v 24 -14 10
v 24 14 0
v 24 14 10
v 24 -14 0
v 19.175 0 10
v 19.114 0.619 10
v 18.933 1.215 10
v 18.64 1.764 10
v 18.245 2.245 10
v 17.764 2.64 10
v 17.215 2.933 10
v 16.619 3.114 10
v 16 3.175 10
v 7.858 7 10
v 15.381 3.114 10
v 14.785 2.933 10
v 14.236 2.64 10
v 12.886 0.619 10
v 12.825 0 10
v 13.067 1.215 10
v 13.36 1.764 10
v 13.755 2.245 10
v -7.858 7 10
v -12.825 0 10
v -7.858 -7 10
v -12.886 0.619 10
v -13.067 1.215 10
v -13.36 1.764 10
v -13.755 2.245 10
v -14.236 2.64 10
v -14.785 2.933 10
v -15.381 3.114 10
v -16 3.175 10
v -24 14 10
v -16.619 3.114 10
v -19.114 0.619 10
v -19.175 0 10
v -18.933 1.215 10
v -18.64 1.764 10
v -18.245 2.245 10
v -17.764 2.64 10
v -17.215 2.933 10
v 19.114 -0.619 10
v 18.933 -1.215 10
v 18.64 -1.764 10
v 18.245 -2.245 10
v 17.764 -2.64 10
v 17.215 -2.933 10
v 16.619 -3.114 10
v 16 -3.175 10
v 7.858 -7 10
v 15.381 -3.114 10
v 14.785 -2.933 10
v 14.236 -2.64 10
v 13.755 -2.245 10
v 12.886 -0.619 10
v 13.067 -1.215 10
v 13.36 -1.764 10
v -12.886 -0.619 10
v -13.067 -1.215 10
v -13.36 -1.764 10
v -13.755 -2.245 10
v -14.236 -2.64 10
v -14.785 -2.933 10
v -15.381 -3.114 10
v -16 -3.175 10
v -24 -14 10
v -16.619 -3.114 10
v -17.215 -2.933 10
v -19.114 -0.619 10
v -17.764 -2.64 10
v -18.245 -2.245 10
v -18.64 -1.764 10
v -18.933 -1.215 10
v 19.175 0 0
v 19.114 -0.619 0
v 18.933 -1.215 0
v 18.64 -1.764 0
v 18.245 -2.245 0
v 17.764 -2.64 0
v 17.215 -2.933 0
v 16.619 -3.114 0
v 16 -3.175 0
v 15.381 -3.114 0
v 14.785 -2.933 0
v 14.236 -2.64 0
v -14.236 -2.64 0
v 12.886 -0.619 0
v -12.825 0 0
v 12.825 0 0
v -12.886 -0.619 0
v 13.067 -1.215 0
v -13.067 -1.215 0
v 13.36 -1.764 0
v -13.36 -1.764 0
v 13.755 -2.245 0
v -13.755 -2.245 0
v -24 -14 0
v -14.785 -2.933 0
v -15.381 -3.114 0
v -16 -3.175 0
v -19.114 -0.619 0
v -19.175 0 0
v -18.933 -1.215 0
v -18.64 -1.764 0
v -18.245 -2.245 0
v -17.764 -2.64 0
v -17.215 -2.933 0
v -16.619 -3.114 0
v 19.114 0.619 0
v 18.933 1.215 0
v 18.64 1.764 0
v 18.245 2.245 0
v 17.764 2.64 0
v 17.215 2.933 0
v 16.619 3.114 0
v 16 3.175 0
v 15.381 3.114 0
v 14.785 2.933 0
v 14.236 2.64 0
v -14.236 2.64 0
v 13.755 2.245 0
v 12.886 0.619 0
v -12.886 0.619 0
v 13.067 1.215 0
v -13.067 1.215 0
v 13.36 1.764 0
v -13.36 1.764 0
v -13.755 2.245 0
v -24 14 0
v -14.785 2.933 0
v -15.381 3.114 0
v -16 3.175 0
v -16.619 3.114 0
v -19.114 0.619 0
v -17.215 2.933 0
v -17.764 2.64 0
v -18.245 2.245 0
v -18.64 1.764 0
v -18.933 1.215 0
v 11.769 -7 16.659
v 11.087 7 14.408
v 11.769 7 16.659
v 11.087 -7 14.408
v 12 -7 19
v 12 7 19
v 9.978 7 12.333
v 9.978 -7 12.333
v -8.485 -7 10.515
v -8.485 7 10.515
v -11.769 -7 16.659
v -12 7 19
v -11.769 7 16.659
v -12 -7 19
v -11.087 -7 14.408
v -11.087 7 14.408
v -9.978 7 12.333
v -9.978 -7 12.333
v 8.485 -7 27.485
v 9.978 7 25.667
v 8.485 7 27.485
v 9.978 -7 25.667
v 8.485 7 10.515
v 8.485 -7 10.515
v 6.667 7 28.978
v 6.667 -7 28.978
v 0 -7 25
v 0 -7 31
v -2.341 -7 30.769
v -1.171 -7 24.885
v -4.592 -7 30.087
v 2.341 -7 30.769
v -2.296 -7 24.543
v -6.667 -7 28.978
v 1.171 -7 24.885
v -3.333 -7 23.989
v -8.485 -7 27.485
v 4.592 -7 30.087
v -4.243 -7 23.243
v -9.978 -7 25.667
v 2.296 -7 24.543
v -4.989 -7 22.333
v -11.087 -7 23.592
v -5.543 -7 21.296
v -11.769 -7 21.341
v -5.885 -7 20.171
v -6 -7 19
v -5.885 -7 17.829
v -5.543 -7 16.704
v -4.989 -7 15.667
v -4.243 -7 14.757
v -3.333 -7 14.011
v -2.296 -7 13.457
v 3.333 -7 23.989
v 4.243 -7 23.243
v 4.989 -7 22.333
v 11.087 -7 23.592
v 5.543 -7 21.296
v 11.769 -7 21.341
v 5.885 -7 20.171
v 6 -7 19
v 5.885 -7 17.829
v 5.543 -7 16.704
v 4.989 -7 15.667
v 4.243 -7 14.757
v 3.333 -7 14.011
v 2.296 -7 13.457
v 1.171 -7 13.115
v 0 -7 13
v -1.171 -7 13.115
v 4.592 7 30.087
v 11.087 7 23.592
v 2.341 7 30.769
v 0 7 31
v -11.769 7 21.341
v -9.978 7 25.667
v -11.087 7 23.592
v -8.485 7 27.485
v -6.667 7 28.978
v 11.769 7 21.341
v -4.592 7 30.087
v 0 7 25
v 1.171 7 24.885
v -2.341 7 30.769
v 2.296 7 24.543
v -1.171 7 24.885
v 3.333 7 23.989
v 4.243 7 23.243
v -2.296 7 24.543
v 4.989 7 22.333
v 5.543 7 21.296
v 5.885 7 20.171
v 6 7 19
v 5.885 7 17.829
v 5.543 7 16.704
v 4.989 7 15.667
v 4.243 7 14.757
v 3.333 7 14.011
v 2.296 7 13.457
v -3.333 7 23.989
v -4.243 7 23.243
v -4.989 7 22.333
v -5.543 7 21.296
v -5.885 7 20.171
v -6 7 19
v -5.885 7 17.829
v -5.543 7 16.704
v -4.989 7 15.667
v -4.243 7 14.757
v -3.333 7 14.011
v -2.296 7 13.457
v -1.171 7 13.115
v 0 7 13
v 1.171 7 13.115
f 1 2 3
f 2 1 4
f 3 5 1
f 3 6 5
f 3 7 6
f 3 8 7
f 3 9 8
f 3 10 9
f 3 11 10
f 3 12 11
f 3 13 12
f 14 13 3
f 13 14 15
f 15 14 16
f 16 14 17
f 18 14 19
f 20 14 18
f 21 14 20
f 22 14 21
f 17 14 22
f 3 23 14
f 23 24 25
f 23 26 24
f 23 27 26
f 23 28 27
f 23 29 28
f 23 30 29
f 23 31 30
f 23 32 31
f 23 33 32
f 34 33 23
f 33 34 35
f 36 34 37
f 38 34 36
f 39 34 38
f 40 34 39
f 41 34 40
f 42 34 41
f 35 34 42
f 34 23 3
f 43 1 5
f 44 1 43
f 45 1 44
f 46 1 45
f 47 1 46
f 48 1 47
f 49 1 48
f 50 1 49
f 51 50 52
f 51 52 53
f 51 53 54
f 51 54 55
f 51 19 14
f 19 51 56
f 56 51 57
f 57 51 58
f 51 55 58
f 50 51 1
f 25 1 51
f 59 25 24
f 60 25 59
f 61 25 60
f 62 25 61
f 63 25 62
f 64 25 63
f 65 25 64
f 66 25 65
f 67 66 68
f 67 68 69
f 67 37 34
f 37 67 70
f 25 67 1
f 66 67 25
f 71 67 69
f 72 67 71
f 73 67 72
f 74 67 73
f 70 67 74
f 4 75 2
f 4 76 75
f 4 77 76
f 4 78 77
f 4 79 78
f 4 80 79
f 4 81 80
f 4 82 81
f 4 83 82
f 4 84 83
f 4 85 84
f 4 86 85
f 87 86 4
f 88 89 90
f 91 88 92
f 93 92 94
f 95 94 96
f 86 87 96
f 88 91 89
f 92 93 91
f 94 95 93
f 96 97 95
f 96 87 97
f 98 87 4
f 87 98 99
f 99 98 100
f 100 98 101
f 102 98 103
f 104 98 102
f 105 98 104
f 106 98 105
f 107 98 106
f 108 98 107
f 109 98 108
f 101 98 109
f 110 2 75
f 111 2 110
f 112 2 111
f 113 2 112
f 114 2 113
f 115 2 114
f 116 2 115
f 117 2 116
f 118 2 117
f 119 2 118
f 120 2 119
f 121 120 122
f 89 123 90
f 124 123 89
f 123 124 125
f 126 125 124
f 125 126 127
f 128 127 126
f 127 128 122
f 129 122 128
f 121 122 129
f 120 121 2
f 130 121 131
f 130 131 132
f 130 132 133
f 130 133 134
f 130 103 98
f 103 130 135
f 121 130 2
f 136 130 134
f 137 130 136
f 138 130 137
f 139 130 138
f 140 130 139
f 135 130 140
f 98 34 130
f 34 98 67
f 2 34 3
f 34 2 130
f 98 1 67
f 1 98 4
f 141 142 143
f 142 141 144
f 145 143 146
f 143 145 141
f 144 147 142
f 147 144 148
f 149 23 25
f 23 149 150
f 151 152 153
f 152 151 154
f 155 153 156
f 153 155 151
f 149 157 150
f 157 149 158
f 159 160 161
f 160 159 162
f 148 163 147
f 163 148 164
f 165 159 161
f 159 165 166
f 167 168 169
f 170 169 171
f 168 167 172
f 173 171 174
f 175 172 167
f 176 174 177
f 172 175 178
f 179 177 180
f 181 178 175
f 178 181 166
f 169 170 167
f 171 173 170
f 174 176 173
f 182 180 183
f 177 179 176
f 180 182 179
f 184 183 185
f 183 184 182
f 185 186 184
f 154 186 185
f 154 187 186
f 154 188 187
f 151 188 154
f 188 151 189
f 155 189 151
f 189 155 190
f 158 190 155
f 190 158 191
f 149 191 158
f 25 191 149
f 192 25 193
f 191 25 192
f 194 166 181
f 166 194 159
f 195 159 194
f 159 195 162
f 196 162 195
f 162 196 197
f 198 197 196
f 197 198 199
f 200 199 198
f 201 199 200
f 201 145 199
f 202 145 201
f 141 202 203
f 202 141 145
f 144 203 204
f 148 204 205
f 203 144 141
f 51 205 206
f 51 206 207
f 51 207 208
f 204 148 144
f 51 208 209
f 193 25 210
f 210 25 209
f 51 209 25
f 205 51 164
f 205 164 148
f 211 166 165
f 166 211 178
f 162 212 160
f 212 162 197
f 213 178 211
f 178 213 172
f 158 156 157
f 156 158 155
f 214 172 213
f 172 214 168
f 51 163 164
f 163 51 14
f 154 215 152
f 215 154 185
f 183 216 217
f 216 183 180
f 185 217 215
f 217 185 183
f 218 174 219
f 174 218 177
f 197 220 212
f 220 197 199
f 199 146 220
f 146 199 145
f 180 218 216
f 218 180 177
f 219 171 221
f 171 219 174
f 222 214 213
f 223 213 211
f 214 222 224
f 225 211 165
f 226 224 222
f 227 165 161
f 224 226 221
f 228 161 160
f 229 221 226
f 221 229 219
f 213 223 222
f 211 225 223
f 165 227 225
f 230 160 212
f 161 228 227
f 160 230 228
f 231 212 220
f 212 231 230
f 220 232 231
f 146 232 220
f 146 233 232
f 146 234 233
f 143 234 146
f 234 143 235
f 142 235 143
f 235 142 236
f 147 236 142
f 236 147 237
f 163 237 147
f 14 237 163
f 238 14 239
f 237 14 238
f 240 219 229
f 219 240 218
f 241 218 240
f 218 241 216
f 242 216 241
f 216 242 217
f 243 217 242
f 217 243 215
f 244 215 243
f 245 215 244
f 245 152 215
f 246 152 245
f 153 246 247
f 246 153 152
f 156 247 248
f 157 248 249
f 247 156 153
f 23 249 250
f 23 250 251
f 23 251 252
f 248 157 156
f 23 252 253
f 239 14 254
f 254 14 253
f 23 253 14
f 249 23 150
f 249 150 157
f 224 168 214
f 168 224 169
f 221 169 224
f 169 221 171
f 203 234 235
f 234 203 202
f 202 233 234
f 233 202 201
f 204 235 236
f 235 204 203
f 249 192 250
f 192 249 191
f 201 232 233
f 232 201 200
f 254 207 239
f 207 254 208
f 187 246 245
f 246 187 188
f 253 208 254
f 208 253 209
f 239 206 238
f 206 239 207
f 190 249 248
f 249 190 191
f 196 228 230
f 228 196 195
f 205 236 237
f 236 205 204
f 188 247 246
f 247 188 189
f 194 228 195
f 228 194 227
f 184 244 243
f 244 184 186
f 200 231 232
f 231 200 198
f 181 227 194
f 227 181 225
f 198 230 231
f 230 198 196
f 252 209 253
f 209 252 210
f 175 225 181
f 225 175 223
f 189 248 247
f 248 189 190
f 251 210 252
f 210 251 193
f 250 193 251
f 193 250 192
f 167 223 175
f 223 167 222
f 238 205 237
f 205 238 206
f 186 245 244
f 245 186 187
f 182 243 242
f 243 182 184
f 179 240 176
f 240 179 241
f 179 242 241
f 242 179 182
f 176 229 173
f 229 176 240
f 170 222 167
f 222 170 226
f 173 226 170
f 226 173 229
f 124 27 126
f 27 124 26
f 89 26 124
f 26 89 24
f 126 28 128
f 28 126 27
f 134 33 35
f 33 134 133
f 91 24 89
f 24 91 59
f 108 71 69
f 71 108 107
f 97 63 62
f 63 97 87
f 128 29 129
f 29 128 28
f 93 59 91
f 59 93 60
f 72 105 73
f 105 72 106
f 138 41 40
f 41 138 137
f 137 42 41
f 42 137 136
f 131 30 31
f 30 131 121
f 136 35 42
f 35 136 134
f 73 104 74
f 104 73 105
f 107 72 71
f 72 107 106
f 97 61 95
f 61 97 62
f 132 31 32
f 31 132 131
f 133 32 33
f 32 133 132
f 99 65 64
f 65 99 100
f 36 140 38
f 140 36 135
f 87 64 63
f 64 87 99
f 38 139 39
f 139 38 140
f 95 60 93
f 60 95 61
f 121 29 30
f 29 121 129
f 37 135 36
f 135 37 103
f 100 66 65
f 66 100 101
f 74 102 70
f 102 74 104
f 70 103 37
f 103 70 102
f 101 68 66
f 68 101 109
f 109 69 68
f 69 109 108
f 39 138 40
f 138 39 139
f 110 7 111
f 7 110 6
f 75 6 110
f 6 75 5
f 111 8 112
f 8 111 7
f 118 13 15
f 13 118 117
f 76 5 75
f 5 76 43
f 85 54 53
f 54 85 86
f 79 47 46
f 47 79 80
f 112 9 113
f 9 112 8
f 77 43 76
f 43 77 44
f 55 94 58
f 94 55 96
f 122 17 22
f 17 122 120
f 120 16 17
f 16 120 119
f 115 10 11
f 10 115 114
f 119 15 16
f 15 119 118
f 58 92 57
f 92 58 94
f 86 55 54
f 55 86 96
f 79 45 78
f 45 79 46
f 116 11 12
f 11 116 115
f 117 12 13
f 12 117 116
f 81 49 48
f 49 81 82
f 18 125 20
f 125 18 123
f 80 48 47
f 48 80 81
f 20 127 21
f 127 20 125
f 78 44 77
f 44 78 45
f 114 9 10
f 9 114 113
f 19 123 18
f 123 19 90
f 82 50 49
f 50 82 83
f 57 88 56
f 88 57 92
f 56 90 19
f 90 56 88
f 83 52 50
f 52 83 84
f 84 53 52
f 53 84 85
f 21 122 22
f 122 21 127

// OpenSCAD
$fn = 32;

// ----------------------------------------------------------------------
// Deck eye: 24 mm eye on a 48 mm base
// ----------------------------------------------------------------------

// --- parameters (mm) ---
base_l = 48;              // base length
base_w = 28;              // base width
base_t = 10;              // base thickness
eye_r = 12;               // eye outside radius
eye_bore = 12;            // eye bore diameter
eye_w = 14;               // eye thickness
eye_z = 19;               // eye centre height
holes_d = 6.35;           // fixing holes
hole_x = 16;              // fixing hole spacing

difference() {
  union() {
    translate([-24, -14, 0]) cube([base_l, base_w, base_t]);
    /* eye standing upright, its foot sunk 3 mm into the base */
    translate([0, -7, 19]) rotate([-90, 0, 0]) cylinder(h = 14, d = 24);
  }
  /* eye bore, 2.5 mm clear of both faces */
  translate([0, -9.5, 19]) rotate([-90, 0, 0]) cylinder(h = 19, d = 12);
  translate([-16, 0, -2.5]) cylinder(h = base_t + 5, d = holes_d);
  translate([16, 0, -2.5]) cylinder(h = base_t + 5, d = holes_d);
}
